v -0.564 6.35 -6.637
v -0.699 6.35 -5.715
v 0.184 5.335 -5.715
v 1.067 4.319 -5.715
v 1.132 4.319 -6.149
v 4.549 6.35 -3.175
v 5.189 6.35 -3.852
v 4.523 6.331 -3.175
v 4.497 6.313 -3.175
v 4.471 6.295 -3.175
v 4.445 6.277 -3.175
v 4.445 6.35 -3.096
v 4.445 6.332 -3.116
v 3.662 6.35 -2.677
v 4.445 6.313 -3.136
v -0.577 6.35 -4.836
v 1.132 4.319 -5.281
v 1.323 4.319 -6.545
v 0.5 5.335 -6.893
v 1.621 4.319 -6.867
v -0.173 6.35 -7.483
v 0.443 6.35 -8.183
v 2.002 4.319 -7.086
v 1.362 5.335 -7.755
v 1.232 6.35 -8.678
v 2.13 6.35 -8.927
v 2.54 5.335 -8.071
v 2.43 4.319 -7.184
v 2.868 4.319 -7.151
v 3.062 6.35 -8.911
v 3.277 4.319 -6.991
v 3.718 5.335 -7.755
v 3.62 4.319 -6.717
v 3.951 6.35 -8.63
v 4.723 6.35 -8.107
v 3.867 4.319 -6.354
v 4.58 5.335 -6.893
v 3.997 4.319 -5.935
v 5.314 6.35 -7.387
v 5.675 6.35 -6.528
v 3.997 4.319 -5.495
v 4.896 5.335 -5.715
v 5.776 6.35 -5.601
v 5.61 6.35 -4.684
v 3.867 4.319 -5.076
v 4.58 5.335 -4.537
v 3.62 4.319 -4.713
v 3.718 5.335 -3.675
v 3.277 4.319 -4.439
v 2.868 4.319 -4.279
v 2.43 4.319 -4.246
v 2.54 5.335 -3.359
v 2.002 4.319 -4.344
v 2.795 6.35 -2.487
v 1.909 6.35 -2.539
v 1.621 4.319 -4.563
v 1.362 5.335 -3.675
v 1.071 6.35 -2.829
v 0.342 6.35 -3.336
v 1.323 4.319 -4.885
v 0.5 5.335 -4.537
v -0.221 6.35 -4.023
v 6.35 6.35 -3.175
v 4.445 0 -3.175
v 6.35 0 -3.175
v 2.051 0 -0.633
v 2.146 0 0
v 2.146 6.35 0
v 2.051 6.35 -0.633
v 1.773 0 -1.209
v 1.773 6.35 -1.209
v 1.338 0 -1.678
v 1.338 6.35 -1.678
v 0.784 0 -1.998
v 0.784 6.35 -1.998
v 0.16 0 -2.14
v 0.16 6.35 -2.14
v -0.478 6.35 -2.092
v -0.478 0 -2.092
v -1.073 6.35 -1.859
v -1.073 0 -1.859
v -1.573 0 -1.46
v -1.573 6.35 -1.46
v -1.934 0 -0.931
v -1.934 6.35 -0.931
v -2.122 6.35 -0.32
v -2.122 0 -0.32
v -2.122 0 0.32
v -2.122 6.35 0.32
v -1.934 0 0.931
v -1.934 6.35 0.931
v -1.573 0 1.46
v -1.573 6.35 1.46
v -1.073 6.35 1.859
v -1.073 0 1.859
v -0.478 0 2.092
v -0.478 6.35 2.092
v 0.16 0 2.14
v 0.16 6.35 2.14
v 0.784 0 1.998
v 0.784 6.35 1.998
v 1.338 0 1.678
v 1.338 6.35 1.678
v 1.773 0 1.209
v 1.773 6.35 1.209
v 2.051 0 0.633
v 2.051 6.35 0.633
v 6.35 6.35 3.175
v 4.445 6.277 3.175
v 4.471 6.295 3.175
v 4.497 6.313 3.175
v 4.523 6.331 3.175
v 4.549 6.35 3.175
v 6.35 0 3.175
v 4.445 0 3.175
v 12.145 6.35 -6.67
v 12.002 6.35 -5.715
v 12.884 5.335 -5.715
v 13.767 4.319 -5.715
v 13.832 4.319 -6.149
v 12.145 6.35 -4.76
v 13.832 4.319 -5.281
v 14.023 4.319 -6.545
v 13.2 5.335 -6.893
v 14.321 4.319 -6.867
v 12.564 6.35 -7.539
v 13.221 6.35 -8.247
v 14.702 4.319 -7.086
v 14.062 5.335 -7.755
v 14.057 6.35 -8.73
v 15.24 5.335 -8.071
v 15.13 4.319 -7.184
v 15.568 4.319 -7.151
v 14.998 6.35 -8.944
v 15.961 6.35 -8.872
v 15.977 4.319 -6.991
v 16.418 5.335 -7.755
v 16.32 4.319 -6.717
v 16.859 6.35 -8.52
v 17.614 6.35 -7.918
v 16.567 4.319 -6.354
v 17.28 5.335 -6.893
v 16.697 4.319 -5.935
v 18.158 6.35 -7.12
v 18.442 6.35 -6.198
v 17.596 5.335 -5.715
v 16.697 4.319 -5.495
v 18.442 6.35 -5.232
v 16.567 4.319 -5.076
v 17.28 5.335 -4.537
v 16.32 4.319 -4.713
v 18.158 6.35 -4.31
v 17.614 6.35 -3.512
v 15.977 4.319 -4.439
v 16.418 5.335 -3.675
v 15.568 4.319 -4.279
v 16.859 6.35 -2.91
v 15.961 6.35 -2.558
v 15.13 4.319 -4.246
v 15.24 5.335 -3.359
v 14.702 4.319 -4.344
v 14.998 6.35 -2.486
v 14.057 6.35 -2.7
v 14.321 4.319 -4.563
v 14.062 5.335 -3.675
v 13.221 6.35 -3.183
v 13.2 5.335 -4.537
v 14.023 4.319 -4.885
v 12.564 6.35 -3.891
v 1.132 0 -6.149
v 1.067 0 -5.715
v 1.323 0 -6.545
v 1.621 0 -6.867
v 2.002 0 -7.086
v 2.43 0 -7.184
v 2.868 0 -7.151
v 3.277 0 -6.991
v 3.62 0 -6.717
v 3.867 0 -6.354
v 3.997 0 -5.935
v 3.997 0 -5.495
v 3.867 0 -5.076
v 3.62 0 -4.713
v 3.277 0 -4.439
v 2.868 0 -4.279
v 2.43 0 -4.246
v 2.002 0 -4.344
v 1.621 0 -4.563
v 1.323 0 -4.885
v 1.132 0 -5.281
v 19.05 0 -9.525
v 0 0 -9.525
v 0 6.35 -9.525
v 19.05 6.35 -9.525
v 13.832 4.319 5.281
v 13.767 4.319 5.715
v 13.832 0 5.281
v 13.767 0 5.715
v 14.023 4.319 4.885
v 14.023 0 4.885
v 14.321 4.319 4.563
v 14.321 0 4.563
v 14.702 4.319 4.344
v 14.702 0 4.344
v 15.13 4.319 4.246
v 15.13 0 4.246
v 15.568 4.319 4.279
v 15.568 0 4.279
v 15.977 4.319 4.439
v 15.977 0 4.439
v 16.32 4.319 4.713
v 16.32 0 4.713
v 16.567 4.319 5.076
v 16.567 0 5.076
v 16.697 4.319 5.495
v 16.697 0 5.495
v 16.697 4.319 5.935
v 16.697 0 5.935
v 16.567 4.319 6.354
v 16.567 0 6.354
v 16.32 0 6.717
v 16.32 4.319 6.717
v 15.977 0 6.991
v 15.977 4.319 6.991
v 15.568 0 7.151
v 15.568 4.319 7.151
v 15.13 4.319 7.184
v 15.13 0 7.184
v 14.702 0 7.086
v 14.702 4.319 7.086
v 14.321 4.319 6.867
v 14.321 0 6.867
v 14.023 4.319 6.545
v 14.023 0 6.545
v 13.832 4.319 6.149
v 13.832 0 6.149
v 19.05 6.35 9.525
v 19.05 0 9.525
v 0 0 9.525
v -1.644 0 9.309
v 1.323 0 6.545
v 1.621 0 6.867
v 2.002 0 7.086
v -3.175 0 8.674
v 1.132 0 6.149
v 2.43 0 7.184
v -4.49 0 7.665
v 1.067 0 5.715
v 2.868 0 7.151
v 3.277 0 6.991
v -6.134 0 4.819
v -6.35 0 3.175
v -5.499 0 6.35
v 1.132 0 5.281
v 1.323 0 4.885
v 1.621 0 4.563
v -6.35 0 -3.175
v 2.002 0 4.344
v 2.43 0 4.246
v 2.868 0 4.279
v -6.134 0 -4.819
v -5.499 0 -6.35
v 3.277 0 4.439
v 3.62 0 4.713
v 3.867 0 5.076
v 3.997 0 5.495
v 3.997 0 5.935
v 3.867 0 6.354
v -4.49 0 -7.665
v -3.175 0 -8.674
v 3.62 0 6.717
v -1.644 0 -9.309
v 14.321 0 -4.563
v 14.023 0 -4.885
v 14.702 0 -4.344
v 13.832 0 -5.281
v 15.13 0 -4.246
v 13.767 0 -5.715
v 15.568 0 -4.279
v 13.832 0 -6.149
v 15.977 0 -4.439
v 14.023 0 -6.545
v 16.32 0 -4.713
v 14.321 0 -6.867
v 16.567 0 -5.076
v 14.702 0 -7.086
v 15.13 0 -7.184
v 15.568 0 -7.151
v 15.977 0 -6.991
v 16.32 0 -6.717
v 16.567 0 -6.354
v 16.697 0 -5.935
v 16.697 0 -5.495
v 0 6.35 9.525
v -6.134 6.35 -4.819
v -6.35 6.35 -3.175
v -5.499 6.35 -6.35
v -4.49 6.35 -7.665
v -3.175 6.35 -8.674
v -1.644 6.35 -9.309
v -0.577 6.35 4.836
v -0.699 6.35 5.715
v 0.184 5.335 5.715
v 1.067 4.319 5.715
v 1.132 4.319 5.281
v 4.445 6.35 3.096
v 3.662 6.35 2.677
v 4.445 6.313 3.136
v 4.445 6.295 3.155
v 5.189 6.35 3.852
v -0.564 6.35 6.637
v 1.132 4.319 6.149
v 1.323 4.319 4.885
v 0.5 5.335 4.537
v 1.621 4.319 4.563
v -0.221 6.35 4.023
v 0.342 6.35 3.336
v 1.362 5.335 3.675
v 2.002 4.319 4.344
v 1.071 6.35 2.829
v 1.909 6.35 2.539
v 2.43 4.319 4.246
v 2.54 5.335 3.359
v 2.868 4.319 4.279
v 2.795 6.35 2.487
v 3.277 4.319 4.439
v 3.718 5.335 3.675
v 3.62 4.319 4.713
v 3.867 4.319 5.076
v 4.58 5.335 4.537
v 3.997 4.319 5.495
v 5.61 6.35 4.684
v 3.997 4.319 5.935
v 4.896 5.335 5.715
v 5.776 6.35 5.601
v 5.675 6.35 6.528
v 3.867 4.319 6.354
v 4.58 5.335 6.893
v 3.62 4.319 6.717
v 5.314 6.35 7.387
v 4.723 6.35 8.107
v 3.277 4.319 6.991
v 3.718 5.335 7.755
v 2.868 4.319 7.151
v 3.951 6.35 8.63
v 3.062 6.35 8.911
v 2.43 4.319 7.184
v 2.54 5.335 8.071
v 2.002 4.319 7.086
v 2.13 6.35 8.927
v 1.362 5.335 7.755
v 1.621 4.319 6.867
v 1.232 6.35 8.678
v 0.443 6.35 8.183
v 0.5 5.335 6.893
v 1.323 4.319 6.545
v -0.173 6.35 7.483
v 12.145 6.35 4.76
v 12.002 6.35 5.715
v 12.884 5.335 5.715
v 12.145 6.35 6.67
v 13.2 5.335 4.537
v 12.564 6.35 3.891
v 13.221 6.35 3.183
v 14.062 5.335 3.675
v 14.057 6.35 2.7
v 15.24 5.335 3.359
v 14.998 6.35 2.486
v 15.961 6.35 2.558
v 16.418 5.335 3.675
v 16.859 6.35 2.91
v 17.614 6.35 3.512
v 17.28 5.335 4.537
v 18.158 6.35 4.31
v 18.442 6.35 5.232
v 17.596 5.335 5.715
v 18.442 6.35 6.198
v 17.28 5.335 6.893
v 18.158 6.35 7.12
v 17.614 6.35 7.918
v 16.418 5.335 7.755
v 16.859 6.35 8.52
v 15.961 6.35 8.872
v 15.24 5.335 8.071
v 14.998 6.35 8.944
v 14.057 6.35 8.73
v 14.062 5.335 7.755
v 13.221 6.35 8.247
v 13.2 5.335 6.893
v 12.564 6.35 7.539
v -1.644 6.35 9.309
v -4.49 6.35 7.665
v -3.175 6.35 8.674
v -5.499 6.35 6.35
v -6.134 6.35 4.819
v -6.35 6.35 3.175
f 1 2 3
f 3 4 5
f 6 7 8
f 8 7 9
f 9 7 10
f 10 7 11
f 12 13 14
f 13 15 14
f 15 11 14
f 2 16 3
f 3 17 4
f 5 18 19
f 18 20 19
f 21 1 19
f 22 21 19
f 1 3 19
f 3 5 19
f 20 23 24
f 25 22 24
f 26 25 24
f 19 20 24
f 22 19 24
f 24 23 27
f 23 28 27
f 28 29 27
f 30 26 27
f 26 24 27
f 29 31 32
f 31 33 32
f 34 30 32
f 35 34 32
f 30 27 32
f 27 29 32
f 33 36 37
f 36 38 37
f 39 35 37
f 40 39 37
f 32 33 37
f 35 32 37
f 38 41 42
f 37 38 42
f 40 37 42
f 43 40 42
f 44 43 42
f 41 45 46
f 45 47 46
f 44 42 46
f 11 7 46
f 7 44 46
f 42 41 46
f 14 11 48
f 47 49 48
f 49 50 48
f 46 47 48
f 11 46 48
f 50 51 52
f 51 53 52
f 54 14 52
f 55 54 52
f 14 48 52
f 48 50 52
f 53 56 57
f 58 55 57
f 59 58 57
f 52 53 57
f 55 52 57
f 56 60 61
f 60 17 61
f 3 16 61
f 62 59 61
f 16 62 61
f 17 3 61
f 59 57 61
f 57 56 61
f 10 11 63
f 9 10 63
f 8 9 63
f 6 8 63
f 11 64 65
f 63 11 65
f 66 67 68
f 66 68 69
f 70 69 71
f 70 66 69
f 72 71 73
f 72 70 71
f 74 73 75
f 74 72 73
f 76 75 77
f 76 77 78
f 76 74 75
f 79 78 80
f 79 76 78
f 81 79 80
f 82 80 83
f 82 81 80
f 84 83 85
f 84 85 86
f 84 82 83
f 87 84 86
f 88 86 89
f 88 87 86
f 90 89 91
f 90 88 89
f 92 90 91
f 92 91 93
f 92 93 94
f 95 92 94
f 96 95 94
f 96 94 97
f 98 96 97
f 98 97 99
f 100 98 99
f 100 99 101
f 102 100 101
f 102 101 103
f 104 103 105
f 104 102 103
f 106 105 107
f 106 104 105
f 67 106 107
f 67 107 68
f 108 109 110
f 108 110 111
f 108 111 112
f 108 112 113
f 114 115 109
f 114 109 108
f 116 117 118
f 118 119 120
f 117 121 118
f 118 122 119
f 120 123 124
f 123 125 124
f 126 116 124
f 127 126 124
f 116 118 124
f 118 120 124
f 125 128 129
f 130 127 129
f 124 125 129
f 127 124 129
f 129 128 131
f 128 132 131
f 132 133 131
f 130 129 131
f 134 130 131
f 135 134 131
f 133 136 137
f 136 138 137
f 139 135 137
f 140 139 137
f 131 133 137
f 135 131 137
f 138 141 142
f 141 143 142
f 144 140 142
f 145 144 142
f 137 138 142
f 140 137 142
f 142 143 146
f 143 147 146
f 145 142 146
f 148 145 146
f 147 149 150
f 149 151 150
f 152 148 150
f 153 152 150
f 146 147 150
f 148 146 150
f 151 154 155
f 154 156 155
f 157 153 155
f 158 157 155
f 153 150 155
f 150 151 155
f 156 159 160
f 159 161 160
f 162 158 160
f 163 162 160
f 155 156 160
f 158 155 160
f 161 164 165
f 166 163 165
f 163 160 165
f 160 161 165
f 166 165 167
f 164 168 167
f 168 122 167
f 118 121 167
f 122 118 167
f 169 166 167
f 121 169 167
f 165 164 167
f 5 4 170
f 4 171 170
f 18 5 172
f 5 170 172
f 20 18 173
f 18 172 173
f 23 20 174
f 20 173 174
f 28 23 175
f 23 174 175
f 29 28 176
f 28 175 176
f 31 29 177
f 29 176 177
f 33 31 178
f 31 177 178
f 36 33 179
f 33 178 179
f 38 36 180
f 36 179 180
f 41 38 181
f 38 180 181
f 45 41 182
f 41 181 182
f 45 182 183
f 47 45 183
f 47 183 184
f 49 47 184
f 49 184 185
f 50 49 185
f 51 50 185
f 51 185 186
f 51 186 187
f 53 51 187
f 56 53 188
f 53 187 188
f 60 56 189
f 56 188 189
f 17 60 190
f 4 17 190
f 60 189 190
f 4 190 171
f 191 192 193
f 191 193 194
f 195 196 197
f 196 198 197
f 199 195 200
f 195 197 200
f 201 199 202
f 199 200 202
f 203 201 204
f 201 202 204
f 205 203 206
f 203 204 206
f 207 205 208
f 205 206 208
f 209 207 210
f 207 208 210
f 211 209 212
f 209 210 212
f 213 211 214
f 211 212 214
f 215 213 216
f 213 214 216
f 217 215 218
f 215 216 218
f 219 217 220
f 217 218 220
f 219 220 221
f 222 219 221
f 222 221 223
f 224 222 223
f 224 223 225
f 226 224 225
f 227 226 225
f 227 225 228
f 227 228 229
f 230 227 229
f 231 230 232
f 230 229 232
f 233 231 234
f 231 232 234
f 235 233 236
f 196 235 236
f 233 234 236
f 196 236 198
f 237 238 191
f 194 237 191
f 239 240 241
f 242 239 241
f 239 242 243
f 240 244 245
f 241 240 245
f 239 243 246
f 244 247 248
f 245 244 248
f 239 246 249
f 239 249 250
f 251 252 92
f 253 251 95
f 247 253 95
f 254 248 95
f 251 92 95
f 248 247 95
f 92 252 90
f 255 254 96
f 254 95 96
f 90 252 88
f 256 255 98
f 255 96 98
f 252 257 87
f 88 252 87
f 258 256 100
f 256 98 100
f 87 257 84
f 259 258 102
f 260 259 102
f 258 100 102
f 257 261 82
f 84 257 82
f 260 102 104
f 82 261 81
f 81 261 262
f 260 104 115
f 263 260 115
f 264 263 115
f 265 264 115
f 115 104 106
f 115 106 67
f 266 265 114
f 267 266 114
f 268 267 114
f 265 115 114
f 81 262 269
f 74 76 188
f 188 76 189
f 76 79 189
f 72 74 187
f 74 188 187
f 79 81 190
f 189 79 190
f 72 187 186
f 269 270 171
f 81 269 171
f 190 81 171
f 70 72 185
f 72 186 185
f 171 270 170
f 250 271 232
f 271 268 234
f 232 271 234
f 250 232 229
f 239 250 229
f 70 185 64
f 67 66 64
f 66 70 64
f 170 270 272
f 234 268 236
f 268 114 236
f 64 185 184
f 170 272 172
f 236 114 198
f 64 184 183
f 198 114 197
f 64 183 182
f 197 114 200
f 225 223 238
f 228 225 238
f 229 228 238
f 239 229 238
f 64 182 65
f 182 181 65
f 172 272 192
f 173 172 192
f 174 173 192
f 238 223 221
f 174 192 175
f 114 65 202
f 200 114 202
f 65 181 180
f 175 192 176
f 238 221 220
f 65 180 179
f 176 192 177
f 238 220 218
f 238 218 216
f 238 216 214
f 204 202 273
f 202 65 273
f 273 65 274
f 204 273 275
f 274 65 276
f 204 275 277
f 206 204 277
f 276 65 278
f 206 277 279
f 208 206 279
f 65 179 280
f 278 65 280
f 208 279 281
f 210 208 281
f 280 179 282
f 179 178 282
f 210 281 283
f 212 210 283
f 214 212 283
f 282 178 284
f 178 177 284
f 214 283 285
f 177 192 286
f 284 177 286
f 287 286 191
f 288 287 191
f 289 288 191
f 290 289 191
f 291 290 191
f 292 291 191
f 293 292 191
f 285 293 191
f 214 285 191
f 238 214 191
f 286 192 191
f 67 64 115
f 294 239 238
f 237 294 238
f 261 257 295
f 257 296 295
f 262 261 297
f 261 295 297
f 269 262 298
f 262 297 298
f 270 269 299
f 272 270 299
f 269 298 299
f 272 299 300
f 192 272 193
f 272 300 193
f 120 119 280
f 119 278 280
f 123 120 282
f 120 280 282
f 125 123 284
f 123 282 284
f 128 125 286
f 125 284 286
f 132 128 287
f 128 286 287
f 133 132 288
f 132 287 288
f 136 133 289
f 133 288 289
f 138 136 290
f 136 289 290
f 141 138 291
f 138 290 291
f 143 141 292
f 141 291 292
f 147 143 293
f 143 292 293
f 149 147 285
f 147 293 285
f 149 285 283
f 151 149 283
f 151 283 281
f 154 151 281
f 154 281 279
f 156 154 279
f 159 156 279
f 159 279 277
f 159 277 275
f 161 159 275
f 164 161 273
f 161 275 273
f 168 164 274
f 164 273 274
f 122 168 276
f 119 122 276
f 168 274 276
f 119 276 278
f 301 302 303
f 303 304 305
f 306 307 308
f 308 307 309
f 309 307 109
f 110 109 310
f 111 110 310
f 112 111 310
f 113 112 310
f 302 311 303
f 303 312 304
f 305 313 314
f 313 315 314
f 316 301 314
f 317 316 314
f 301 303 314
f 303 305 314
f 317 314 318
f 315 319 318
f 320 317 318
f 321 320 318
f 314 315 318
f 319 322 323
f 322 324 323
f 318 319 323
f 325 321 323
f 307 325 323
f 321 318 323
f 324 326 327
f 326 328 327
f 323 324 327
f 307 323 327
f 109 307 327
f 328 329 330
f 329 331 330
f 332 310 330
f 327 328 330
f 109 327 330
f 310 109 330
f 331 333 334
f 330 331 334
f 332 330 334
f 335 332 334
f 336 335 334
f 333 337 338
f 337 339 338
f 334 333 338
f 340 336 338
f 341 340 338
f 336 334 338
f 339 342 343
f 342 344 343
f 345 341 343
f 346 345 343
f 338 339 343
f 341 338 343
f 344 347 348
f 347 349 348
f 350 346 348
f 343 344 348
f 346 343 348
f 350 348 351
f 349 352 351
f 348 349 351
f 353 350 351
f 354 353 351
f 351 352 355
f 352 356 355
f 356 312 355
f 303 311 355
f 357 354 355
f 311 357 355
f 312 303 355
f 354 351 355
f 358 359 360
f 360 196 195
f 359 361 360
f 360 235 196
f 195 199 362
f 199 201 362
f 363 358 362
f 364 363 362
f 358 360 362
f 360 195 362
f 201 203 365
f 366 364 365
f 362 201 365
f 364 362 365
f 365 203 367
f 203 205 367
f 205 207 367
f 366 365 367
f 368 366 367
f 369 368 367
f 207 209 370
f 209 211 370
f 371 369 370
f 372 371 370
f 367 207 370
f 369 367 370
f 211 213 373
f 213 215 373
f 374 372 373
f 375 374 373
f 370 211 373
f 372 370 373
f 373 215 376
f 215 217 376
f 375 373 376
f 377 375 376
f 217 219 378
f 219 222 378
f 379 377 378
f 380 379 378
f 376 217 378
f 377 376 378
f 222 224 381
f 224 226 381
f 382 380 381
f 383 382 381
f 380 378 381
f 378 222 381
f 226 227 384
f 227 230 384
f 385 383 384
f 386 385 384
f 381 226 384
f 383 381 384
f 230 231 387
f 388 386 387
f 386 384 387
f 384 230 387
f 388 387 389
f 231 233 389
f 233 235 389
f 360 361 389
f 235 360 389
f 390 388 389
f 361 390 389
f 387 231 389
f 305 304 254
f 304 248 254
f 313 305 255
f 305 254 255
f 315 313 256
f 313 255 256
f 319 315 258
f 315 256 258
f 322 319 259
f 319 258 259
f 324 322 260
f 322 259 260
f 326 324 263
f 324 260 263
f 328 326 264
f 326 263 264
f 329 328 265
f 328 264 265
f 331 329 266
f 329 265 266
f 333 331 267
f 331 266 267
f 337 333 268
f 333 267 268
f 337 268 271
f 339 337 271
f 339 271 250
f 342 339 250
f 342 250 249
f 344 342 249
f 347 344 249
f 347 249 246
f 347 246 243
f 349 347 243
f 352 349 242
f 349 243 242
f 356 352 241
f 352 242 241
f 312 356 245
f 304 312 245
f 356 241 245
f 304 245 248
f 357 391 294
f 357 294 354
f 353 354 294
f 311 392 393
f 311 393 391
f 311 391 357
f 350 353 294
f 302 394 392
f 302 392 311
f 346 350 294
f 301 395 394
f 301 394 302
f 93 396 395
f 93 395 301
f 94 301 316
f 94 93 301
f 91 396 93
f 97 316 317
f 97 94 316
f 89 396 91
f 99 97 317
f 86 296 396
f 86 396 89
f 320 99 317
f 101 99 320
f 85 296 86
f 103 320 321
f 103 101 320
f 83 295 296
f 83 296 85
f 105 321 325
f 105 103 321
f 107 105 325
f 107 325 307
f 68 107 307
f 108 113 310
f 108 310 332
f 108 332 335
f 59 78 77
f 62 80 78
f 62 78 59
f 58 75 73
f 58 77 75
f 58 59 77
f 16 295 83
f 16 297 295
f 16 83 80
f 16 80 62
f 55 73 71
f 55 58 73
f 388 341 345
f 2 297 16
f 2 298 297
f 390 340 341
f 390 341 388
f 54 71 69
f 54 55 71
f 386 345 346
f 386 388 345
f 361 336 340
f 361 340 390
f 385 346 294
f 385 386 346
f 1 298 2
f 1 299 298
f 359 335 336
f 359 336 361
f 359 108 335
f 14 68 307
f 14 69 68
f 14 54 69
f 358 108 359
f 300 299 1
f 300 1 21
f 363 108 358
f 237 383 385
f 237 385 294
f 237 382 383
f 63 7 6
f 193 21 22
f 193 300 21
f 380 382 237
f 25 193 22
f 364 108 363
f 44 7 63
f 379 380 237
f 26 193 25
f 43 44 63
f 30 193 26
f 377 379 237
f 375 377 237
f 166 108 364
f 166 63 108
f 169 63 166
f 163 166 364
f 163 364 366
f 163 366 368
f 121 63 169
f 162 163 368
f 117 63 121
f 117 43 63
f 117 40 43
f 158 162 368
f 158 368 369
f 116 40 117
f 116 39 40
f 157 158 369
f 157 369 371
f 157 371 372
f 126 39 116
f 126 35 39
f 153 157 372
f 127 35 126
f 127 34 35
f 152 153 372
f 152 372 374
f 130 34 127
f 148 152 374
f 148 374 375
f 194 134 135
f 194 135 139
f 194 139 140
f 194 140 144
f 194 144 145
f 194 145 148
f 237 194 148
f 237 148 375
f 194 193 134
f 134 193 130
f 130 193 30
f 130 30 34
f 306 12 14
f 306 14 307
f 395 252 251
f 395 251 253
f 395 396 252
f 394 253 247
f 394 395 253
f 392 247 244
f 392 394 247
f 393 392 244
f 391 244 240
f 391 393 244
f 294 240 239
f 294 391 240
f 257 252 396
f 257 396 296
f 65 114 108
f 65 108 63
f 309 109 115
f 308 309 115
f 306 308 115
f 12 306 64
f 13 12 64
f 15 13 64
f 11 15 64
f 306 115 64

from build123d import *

# Parameters (mm, degrees)
SKETCH1_W                                         = 25.4
SKETCH1_H                                         = 19.05
SKETCH1_R                                         = 2.1463
SKETCH1_W_2                                       = 1.905
SKETCH1_H_2                                       = 6.35
BOSS_EXTRUDE1_DEPTH                               = 6.35
CSK_FOR_4_FLAT_HEAD_SOCKET_CAP_SCREW1_D           = 2.9464
CSK_FOR_4_FLAT_HEAD_SOCKET_CAP_SCREW1_CSINK_D     = 6.477
CSK_FOR_4_FLAT_HEAD_SOCKET_CAP_SCREW1_CSINK_ANGLE = 82
FILLET1_R                                         = 6.35


with BuildPart() as part:
    # Sketch1 → Boss-Extrude1 (new body)
    with BuildSketch(Plane(origin=(0, 0, 0), x_dir=(1, 0, 0), z_dir=(0, 1, 0))):
        with Locations((6.35, 0)):
            Rectangle(SKETCH1_W, SKETCH1_H)
        Circle(SKETCH1_R, mode=Mode.SUBTRACT)
        with Locations((5.3975, 0)):
            Rectangle(SKETCH1_W_2, SKETCH1_H_2, mode=Mode.SUBTRACT)
    extrude(amount=BOSS_EXTRUDE1_DEPTH)

    # CSK for #4 Flat Head Socket Cap Screw1 (through all)
    with Locations(Plane(origin=(0, 6.35, 0), x_dir=(1, 0, 0), z_dir=(0, 1, 0))):
        with Locations((2.54, 5.715), (15.24, -5.715), (2.54, -5.715), (15.24, 5.715)):
            CounterSinkHole(CSK_FOR_4_FLAT_HEAD_SOCKET_CAP_SCREW1_D / 2, CSK_FOR_4_FLAT_HEAD_SOCKET_CAP_SCREW1_CSINK_D / 2, counter_sink_angle=CSK_FOR_4_FLAT_HEAD_SOCKET_CAP_SCREW1_CSINK_ANGLE)

    # Fillet1
    fillet1_edges = [part.edges().sort_by_distance(p)[0] for p in [
        (-6.35, 3.175, -9.525),
        (-6.35, 3.175, 9.525),
    ]]
    fillet(fillet1_edges, radius=FILLET1_R)


solid = part.part
